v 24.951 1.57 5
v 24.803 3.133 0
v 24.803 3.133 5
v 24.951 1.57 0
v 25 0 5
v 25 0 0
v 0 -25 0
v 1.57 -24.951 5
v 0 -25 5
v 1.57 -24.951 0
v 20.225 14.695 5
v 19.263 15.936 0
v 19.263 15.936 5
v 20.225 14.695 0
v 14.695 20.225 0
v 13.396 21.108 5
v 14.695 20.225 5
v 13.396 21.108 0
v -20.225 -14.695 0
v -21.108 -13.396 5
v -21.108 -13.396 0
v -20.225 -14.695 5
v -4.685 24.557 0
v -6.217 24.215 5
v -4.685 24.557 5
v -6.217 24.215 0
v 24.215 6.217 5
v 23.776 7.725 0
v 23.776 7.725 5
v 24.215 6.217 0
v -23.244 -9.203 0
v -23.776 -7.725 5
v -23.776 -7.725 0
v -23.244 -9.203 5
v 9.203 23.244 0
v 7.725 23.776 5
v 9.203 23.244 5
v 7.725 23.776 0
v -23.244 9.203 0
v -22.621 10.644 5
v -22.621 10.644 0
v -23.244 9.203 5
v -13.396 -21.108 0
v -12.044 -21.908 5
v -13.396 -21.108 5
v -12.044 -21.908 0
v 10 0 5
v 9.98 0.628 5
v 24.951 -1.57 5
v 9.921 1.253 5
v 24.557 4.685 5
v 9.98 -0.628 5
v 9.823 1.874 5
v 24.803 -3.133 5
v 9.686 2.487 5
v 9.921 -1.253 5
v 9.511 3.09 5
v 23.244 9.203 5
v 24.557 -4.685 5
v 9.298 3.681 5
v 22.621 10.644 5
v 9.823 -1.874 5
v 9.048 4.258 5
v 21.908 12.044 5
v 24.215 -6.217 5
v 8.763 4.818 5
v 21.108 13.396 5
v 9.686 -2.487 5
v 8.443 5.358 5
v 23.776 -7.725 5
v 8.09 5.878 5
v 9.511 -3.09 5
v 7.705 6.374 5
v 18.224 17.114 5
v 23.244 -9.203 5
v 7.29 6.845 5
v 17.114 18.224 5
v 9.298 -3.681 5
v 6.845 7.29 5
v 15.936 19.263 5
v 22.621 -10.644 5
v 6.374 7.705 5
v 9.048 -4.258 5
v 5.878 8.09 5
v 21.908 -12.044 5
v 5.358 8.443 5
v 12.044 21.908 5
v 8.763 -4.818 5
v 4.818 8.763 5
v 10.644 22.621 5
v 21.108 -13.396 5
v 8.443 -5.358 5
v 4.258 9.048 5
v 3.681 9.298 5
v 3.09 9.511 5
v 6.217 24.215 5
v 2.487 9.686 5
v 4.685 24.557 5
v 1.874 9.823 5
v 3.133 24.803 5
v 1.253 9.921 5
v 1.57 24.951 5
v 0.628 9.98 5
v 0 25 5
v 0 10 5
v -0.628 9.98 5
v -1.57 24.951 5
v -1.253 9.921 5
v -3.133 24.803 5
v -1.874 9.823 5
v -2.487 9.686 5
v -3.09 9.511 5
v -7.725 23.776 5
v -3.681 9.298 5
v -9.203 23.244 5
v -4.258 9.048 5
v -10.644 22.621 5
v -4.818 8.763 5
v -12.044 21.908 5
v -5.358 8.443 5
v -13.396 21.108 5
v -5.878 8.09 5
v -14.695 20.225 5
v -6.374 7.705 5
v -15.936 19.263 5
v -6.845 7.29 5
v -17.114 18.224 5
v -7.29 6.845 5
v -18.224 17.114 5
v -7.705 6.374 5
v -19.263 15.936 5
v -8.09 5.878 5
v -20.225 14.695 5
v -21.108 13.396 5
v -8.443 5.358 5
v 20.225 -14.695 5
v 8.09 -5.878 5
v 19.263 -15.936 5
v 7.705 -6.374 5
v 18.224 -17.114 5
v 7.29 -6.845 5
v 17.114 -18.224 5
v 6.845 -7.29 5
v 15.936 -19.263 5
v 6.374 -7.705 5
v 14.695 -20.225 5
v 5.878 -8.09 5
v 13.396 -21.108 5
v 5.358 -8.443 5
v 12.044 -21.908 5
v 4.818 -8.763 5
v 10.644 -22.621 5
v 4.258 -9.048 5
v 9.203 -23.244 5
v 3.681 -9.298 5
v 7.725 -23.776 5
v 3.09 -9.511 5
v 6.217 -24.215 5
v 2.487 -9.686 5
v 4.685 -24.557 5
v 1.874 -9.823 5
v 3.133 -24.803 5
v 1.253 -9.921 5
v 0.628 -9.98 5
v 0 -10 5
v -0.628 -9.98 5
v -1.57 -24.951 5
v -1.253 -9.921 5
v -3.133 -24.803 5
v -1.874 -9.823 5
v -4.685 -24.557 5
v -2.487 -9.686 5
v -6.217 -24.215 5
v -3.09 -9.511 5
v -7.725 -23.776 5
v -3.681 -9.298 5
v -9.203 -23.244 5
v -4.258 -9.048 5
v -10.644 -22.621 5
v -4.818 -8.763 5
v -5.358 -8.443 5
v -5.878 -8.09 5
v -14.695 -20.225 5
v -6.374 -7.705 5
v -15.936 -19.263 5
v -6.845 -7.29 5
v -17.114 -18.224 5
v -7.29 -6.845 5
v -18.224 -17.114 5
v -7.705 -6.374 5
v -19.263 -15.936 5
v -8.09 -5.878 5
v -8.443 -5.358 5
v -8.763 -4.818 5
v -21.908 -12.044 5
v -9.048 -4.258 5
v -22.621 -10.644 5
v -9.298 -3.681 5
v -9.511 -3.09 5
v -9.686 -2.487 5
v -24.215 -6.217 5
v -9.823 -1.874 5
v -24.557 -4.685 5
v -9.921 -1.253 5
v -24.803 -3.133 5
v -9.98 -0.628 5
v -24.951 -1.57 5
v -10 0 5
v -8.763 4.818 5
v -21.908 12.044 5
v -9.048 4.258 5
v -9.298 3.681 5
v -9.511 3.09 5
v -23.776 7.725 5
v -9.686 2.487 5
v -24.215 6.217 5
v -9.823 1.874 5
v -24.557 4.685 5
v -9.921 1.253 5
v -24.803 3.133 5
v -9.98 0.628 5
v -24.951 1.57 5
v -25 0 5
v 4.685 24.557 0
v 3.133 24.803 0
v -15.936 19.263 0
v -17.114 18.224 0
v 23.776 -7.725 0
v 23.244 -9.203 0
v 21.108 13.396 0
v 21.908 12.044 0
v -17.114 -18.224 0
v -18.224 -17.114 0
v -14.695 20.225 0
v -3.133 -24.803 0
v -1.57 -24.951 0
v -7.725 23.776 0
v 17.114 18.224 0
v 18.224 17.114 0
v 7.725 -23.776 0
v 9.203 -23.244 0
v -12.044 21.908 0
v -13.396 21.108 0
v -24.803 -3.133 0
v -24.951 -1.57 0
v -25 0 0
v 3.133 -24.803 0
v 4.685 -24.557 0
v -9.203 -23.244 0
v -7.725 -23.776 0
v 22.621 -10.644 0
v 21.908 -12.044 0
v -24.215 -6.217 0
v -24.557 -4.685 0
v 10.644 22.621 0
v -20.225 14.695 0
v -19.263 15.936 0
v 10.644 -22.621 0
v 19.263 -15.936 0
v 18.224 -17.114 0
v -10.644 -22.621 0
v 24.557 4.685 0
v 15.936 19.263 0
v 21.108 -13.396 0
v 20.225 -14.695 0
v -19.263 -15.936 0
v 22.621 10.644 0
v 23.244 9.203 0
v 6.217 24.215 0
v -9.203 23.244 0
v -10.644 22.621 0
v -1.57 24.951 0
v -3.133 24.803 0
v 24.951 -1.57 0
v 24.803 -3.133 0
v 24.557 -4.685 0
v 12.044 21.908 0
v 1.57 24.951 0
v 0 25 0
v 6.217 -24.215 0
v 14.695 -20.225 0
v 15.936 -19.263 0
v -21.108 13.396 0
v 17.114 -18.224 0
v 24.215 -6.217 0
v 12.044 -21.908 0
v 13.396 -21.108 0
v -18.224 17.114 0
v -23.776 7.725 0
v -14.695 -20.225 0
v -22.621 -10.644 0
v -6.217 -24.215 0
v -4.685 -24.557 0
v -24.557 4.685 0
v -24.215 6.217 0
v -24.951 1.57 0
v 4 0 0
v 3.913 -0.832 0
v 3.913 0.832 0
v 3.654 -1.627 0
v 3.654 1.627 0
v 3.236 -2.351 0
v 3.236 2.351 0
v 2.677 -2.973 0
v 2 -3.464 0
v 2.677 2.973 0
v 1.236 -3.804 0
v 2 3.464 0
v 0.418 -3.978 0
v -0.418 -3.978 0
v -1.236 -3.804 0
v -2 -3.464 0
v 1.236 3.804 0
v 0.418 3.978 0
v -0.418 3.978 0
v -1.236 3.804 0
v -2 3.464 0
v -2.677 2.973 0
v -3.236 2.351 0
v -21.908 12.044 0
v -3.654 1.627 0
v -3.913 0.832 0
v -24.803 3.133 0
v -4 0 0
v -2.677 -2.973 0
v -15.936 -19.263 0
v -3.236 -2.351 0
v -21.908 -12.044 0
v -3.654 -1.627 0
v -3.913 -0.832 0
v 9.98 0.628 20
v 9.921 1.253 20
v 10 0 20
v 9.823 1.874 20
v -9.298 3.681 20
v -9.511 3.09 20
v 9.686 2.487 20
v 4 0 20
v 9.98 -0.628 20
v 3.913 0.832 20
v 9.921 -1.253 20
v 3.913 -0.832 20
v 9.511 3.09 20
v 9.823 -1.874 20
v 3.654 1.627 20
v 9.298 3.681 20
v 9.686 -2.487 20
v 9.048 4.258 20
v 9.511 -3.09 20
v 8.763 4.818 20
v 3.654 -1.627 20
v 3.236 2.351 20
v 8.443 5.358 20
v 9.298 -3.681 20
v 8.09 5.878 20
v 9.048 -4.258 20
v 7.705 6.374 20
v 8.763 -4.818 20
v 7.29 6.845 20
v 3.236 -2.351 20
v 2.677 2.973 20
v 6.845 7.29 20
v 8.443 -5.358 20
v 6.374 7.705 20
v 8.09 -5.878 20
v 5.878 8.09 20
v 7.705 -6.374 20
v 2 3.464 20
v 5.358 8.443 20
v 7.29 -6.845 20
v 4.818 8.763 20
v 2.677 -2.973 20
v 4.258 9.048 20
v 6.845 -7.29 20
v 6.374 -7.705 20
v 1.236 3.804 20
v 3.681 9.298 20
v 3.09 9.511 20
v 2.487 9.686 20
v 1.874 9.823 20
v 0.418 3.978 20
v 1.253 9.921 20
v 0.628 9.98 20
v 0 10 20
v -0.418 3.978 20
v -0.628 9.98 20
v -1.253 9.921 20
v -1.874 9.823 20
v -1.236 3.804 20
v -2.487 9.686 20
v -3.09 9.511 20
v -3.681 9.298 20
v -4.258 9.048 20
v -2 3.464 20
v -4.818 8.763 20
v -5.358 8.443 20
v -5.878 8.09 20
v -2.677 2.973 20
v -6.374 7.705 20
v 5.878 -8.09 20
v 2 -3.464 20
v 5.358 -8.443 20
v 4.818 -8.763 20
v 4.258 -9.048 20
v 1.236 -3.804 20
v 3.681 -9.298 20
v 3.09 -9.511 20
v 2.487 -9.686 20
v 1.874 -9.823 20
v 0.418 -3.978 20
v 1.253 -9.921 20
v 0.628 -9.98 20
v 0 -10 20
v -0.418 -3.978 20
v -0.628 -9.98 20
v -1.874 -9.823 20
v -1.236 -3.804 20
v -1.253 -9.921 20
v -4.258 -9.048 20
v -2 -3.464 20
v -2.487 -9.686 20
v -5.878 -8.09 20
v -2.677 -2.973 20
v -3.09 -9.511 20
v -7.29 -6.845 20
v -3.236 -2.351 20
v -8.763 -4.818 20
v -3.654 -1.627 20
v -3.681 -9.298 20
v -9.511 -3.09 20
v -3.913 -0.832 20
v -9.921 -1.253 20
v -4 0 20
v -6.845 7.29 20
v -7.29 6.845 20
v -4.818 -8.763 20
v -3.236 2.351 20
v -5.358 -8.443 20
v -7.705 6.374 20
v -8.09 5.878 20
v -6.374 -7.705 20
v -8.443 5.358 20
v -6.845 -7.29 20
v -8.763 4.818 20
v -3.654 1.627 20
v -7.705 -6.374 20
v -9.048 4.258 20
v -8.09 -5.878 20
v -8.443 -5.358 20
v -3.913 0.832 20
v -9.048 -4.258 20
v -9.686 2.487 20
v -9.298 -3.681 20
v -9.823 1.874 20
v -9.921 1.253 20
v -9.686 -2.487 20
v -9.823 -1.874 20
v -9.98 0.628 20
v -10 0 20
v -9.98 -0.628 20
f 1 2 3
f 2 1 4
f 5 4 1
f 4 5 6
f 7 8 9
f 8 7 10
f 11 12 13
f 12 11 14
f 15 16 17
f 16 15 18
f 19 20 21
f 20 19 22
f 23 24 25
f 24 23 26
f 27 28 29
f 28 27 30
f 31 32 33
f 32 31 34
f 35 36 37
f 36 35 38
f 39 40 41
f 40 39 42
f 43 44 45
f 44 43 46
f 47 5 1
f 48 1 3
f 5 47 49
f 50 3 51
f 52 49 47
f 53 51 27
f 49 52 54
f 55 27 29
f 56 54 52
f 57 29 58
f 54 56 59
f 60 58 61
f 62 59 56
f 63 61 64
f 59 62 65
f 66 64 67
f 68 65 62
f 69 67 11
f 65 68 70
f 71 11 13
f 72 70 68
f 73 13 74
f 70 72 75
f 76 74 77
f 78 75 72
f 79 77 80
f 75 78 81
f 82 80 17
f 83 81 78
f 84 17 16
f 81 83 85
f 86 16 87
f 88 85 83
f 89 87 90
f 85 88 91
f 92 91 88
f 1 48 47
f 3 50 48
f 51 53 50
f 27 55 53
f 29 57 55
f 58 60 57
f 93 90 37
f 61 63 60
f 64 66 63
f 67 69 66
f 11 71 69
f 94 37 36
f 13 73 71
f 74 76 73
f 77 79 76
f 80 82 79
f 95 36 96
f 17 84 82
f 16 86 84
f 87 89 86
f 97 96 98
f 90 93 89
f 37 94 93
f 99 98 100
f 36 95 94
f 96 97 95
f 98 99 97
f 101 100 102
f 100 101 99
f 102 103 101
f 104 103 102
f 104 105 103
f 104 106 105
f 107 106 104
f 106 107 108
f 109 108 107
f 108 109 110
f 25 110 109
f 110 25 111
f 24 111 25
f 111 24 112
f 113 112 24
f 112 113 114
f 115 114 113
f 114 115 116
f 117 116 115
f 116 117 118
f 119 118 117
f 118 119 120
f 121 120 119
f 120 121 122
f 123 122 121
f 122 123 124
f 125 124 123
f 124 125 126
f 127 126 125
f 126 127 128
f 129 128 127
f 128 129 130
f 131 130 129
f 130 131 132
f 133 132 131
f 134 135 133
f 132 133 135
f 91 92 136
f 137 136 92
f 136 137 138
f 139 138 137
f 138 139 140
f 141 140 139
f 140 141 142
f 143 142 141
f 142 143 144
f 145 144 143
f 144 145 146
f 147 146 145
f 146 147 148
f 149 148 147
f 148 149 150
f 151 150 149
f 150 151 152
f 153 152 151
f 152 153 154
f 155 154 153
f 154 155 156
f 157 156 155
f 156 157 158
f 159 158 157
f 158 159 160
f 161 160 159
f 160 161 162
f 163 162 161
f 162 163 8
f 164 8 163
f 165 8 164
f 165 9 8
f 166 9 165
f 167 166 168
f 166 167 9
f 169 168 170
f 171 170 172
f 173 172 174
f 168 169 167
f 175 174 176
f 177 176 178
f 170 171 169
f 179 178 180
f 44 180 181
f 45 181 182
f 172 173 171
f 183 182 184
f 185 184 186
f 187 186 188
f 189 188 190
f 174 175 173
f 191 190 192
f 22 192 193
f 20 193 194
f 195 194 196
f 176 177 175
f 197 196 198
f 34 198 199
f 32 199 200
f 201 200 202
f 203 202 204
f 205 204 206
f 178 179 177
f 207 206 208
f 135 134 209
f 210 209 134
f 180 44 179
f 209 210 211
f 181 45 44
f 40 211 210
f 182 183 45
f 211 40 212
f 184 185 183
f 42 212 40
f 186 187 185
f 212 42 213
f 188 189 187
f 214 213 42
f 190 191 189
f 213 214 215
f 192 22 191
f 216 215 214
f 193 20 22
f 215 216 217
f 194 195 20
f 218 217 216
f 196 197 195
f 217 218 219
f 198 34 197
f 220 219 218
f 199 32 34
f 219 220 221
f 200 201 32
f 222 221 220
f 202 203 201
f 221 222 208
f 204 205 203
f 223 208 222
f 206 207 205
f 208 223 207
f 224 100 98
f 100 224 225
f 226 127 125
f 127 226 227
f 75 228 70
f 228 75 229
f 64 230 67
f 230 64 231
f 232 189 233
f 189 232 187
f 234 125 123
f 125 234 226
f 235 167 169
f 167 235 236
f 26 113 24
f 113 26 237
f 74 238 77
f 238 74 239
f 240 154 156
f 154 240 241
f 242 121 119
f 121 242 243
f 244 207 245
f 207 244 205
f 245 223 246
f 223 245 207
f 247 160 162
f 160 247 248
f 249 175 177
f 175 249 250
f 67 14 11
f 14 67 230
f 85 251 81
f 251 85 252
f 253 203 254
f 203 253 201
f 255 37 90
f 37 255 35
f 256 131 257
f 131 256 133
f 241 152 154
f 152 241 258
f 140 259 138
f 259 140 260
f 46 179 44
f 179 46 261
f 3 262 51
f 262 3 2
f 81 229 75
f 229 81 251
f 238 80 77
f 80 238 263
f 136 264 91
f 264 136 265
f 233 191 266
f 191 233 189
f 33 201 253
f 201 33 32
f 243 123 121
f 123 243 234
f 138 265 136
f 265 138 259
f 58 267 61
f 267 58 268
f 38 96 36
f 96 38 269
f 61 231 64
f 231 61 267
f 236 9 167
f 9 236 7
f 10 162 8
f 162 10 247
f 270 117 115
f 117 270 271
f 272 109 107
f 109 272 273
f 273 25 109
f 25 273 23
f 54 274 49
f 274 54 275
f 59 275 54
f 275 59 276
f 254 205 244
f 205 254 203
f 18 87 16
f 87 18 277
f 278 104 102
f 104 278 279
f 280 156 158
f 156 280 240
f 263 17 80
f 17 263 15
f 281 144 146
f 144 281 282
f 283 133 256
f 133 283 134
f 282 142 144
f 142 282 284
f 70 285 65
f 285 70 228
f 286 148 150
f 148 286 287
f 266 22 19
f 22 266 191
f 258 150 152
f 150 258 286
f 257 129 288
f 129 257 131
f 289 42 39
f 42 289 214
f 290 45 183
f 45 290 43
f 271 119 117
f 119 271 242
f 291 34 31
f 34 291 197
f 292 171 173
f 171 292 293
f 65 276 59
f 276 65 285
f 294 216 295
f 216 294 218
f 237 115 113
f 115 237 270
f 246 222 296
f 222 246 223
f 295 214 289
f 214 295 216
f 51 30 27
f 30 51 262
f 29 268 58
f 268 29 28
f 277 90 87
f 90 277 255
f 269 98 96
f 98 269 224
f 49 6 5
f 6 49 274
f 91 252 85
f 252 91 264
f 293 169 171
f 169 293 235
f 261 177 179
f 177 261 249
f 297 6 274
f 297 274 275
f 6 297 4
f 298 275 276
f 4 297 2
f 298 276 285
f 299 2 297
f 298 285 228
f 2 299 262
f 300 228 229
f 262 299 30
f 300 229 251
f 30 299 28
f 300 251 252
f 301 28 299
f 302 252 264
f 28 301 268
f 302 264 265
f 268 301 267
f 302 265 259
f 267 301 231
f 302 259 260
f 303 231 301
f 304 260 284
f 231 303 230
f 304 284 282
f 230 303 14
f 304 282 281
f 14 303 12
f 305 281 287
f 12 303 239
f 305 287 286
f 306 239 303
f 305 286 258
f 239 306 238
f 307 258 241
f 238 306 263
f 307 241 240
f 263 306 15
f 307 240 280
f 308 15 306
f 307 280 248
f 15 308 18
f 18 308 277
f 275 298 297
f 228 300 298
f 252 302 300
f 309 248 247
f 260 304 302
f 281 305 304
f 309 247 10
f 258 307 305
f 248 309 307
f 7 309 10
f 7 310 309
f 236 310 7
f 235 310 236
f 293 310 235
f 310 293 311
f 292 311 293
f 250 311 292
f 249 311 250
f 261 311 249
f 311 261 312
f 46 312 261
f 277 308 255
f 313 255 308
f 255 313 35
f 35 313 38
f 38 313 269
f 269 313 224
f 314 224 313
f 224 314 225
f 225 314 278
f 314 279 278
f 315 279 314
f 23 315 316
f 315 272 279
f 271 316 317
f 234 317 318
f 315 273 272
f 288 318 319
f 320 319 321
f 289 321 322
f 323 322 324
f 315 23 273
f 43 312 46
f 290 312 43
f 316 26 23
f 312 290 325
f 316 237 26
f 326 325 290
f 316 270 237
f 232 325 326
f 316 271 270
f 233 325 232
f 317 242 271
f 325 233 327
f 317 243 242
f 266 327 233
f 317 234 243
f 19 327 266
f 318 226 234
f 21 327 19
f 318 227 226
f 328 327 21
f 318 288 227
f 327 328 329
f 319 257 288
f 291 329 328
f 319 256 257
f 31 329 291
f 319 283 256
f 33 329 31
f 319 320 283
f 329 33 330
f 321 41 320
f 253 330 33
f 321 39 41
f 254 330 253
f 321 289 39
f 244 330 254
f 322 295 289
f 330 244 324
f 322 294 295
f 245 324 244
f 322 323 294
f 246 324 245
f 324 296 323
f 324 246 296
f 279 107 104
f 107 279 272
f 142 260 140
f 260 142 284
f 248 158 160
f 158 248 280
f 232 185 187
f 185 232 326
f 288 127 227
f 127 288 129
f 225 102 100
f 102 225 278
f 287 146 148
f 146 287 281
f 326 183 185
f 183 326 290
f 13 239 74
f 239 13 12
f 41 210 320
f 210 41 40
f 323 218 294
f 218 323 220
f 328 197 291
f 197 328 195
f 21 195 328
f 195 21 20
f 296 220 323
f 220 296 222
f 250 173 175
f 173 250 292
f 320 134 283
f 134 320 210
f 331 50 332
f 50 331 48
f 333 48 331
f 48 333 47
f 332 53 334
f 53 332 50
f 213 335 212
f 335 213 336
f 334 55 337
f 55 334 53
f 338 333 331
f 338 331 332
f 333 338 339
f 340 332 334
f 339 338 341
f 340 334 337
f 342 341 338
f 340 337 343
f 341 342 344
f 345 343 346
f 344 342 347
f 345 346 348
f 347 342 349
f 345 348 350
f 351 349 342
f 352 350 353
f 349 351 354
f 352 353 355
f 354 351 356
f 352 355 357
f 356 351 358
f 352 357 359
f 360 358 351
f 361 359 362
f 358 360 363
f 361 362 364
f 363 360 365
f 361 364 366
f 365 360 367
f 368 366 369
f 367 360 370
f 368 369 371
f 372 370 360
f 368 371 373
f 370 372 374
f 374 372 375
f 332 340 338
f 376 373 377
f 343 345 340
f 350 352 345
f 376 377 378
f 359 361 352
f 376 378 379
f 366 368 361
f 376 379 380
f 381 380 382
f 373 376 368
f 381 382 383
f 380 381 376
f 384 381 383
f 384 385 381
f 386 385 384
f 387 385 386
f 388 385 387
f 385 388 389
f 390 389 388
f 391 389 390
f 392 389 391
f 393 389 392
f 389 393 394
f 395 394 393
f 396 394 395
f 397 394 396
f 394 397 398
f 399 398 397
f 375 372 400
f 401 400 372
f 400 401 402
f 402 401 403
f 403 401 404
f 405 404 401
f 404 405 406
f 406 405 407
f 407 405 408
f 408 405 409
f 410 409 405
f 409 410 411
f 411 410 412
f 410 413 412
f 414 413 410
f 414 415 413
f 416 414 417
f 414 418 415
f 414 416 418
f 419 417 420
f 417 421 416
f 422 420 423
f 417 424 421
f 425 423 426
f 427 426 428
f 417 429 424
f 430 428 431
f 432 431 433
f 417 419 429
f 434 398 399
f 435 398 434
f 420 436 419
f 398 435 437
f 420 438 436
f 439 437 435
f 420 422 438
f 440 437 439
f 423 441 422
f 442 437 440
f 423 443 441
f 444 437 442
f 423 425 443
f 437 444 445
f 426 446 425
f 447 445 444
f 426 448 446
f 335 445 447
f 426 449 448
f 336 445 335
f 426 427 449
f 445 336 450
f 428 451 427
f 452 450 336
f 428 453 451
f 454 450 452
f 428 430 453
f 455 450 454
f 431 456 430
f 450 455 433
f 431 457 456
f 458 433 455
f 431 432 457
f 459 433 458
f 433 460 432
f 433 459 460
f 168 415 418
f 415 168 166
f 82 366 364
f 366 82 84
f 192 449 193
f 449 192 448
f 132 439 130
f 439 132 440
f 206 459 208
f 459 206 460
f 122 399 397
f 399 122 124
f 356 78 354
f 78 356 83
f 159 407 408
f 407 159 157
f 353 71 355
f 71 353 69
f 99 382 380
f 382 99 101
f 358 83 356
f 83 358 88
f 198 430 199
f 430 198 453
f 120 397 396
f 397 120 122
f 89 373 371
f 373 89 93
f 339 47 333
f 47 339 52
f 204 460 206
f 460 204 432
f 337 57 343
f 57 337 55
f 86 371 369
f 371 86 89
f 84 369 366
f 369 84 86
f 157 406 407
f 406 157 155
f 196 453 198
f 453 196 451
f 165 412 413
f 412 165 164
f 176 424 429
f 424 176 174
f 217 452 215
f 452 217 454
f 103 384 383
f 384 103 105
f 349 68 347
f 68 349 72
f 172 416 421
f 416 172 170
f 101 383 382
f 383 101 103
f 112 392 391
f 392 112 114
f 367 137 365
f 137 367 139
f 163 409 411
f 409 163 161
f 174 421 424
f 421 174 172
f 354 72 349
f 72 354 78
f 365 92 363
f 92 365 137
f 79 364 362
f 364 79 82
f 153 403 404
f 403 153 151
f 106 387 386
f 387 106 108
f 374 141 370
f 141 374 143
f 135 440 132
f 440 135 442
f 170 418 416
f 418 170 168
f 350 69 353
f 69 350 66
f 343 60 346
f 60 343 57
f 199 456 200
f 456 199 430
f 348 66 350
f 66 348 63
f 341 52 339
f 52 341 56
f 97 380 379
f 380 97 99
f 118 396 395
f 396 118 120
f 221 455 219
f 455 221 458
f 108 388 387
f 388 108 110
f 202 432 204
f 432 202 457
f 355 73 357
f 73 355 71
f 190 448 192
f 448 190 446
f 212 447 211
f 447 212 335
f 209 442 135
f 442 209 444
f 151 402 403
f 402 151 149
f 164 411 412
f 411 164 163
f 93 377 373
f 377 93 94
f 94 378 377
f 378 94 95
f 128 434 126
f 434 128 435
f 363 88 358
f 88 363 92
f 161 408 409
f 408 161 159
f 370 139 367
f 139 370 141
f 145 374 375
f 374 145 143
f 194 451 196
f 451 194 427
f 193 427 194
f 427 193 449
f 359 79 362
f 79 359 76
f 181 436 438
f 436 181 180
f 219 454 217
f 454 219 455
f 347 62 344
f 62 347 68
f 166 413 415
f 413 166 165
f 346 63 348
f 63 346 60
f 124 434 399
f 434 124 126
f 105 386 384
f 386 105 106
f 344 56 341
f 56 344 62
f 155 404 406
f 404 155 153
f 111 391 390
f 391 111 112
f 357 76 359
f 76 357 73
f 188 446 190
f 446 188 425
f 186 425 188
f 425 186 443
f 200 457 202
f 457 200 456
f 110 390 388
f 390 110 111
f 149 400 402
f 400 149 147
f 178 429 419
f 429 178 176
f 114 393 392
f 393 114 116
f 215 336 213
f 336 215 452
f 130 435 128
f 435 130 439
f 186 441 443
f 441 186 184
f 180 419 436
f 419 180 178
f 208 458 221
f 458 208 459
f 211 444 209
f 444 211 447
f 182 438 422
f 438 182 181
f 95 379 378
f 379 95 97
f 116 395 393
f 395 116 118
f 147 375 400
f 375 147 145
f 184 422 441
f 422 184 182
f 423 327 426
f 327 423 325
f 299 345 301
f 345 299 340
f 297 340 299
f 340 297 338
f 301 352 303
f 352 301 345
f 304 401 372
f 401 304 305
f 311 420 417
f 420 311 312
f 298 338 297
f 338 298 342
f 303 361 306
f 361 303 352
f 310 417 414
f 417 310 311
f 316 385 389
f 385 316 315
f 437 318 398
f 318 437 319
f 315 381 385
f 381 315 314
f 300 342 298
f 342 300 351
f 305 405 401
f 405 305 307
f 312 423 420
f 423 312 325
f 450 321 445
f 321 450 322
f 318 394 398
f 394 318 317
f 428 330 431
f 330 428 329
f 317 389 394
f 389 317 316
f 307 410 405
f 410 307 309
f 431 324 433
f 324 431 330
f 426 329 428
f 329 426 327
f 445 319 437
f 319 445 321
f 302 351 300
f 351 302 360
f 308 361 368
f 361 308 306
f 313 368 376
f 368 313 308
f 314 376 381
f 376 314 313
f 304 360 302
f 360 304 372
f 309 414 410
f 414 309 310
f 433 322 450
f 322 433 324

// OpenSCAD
//-- Rueda con porta eje y taladro para el eje
difference(){
    //-- Rueda
    union(){
        //-- Base de la rueda
        cylinder(r=50/2, h=5, $fn=100);
        //--Porta ejes
        cylinder(r=20/2, h=20, $fn=100);
    }
    //-- Taladro
    cylinder(r=8/2, h=80, $fn=30);
}
